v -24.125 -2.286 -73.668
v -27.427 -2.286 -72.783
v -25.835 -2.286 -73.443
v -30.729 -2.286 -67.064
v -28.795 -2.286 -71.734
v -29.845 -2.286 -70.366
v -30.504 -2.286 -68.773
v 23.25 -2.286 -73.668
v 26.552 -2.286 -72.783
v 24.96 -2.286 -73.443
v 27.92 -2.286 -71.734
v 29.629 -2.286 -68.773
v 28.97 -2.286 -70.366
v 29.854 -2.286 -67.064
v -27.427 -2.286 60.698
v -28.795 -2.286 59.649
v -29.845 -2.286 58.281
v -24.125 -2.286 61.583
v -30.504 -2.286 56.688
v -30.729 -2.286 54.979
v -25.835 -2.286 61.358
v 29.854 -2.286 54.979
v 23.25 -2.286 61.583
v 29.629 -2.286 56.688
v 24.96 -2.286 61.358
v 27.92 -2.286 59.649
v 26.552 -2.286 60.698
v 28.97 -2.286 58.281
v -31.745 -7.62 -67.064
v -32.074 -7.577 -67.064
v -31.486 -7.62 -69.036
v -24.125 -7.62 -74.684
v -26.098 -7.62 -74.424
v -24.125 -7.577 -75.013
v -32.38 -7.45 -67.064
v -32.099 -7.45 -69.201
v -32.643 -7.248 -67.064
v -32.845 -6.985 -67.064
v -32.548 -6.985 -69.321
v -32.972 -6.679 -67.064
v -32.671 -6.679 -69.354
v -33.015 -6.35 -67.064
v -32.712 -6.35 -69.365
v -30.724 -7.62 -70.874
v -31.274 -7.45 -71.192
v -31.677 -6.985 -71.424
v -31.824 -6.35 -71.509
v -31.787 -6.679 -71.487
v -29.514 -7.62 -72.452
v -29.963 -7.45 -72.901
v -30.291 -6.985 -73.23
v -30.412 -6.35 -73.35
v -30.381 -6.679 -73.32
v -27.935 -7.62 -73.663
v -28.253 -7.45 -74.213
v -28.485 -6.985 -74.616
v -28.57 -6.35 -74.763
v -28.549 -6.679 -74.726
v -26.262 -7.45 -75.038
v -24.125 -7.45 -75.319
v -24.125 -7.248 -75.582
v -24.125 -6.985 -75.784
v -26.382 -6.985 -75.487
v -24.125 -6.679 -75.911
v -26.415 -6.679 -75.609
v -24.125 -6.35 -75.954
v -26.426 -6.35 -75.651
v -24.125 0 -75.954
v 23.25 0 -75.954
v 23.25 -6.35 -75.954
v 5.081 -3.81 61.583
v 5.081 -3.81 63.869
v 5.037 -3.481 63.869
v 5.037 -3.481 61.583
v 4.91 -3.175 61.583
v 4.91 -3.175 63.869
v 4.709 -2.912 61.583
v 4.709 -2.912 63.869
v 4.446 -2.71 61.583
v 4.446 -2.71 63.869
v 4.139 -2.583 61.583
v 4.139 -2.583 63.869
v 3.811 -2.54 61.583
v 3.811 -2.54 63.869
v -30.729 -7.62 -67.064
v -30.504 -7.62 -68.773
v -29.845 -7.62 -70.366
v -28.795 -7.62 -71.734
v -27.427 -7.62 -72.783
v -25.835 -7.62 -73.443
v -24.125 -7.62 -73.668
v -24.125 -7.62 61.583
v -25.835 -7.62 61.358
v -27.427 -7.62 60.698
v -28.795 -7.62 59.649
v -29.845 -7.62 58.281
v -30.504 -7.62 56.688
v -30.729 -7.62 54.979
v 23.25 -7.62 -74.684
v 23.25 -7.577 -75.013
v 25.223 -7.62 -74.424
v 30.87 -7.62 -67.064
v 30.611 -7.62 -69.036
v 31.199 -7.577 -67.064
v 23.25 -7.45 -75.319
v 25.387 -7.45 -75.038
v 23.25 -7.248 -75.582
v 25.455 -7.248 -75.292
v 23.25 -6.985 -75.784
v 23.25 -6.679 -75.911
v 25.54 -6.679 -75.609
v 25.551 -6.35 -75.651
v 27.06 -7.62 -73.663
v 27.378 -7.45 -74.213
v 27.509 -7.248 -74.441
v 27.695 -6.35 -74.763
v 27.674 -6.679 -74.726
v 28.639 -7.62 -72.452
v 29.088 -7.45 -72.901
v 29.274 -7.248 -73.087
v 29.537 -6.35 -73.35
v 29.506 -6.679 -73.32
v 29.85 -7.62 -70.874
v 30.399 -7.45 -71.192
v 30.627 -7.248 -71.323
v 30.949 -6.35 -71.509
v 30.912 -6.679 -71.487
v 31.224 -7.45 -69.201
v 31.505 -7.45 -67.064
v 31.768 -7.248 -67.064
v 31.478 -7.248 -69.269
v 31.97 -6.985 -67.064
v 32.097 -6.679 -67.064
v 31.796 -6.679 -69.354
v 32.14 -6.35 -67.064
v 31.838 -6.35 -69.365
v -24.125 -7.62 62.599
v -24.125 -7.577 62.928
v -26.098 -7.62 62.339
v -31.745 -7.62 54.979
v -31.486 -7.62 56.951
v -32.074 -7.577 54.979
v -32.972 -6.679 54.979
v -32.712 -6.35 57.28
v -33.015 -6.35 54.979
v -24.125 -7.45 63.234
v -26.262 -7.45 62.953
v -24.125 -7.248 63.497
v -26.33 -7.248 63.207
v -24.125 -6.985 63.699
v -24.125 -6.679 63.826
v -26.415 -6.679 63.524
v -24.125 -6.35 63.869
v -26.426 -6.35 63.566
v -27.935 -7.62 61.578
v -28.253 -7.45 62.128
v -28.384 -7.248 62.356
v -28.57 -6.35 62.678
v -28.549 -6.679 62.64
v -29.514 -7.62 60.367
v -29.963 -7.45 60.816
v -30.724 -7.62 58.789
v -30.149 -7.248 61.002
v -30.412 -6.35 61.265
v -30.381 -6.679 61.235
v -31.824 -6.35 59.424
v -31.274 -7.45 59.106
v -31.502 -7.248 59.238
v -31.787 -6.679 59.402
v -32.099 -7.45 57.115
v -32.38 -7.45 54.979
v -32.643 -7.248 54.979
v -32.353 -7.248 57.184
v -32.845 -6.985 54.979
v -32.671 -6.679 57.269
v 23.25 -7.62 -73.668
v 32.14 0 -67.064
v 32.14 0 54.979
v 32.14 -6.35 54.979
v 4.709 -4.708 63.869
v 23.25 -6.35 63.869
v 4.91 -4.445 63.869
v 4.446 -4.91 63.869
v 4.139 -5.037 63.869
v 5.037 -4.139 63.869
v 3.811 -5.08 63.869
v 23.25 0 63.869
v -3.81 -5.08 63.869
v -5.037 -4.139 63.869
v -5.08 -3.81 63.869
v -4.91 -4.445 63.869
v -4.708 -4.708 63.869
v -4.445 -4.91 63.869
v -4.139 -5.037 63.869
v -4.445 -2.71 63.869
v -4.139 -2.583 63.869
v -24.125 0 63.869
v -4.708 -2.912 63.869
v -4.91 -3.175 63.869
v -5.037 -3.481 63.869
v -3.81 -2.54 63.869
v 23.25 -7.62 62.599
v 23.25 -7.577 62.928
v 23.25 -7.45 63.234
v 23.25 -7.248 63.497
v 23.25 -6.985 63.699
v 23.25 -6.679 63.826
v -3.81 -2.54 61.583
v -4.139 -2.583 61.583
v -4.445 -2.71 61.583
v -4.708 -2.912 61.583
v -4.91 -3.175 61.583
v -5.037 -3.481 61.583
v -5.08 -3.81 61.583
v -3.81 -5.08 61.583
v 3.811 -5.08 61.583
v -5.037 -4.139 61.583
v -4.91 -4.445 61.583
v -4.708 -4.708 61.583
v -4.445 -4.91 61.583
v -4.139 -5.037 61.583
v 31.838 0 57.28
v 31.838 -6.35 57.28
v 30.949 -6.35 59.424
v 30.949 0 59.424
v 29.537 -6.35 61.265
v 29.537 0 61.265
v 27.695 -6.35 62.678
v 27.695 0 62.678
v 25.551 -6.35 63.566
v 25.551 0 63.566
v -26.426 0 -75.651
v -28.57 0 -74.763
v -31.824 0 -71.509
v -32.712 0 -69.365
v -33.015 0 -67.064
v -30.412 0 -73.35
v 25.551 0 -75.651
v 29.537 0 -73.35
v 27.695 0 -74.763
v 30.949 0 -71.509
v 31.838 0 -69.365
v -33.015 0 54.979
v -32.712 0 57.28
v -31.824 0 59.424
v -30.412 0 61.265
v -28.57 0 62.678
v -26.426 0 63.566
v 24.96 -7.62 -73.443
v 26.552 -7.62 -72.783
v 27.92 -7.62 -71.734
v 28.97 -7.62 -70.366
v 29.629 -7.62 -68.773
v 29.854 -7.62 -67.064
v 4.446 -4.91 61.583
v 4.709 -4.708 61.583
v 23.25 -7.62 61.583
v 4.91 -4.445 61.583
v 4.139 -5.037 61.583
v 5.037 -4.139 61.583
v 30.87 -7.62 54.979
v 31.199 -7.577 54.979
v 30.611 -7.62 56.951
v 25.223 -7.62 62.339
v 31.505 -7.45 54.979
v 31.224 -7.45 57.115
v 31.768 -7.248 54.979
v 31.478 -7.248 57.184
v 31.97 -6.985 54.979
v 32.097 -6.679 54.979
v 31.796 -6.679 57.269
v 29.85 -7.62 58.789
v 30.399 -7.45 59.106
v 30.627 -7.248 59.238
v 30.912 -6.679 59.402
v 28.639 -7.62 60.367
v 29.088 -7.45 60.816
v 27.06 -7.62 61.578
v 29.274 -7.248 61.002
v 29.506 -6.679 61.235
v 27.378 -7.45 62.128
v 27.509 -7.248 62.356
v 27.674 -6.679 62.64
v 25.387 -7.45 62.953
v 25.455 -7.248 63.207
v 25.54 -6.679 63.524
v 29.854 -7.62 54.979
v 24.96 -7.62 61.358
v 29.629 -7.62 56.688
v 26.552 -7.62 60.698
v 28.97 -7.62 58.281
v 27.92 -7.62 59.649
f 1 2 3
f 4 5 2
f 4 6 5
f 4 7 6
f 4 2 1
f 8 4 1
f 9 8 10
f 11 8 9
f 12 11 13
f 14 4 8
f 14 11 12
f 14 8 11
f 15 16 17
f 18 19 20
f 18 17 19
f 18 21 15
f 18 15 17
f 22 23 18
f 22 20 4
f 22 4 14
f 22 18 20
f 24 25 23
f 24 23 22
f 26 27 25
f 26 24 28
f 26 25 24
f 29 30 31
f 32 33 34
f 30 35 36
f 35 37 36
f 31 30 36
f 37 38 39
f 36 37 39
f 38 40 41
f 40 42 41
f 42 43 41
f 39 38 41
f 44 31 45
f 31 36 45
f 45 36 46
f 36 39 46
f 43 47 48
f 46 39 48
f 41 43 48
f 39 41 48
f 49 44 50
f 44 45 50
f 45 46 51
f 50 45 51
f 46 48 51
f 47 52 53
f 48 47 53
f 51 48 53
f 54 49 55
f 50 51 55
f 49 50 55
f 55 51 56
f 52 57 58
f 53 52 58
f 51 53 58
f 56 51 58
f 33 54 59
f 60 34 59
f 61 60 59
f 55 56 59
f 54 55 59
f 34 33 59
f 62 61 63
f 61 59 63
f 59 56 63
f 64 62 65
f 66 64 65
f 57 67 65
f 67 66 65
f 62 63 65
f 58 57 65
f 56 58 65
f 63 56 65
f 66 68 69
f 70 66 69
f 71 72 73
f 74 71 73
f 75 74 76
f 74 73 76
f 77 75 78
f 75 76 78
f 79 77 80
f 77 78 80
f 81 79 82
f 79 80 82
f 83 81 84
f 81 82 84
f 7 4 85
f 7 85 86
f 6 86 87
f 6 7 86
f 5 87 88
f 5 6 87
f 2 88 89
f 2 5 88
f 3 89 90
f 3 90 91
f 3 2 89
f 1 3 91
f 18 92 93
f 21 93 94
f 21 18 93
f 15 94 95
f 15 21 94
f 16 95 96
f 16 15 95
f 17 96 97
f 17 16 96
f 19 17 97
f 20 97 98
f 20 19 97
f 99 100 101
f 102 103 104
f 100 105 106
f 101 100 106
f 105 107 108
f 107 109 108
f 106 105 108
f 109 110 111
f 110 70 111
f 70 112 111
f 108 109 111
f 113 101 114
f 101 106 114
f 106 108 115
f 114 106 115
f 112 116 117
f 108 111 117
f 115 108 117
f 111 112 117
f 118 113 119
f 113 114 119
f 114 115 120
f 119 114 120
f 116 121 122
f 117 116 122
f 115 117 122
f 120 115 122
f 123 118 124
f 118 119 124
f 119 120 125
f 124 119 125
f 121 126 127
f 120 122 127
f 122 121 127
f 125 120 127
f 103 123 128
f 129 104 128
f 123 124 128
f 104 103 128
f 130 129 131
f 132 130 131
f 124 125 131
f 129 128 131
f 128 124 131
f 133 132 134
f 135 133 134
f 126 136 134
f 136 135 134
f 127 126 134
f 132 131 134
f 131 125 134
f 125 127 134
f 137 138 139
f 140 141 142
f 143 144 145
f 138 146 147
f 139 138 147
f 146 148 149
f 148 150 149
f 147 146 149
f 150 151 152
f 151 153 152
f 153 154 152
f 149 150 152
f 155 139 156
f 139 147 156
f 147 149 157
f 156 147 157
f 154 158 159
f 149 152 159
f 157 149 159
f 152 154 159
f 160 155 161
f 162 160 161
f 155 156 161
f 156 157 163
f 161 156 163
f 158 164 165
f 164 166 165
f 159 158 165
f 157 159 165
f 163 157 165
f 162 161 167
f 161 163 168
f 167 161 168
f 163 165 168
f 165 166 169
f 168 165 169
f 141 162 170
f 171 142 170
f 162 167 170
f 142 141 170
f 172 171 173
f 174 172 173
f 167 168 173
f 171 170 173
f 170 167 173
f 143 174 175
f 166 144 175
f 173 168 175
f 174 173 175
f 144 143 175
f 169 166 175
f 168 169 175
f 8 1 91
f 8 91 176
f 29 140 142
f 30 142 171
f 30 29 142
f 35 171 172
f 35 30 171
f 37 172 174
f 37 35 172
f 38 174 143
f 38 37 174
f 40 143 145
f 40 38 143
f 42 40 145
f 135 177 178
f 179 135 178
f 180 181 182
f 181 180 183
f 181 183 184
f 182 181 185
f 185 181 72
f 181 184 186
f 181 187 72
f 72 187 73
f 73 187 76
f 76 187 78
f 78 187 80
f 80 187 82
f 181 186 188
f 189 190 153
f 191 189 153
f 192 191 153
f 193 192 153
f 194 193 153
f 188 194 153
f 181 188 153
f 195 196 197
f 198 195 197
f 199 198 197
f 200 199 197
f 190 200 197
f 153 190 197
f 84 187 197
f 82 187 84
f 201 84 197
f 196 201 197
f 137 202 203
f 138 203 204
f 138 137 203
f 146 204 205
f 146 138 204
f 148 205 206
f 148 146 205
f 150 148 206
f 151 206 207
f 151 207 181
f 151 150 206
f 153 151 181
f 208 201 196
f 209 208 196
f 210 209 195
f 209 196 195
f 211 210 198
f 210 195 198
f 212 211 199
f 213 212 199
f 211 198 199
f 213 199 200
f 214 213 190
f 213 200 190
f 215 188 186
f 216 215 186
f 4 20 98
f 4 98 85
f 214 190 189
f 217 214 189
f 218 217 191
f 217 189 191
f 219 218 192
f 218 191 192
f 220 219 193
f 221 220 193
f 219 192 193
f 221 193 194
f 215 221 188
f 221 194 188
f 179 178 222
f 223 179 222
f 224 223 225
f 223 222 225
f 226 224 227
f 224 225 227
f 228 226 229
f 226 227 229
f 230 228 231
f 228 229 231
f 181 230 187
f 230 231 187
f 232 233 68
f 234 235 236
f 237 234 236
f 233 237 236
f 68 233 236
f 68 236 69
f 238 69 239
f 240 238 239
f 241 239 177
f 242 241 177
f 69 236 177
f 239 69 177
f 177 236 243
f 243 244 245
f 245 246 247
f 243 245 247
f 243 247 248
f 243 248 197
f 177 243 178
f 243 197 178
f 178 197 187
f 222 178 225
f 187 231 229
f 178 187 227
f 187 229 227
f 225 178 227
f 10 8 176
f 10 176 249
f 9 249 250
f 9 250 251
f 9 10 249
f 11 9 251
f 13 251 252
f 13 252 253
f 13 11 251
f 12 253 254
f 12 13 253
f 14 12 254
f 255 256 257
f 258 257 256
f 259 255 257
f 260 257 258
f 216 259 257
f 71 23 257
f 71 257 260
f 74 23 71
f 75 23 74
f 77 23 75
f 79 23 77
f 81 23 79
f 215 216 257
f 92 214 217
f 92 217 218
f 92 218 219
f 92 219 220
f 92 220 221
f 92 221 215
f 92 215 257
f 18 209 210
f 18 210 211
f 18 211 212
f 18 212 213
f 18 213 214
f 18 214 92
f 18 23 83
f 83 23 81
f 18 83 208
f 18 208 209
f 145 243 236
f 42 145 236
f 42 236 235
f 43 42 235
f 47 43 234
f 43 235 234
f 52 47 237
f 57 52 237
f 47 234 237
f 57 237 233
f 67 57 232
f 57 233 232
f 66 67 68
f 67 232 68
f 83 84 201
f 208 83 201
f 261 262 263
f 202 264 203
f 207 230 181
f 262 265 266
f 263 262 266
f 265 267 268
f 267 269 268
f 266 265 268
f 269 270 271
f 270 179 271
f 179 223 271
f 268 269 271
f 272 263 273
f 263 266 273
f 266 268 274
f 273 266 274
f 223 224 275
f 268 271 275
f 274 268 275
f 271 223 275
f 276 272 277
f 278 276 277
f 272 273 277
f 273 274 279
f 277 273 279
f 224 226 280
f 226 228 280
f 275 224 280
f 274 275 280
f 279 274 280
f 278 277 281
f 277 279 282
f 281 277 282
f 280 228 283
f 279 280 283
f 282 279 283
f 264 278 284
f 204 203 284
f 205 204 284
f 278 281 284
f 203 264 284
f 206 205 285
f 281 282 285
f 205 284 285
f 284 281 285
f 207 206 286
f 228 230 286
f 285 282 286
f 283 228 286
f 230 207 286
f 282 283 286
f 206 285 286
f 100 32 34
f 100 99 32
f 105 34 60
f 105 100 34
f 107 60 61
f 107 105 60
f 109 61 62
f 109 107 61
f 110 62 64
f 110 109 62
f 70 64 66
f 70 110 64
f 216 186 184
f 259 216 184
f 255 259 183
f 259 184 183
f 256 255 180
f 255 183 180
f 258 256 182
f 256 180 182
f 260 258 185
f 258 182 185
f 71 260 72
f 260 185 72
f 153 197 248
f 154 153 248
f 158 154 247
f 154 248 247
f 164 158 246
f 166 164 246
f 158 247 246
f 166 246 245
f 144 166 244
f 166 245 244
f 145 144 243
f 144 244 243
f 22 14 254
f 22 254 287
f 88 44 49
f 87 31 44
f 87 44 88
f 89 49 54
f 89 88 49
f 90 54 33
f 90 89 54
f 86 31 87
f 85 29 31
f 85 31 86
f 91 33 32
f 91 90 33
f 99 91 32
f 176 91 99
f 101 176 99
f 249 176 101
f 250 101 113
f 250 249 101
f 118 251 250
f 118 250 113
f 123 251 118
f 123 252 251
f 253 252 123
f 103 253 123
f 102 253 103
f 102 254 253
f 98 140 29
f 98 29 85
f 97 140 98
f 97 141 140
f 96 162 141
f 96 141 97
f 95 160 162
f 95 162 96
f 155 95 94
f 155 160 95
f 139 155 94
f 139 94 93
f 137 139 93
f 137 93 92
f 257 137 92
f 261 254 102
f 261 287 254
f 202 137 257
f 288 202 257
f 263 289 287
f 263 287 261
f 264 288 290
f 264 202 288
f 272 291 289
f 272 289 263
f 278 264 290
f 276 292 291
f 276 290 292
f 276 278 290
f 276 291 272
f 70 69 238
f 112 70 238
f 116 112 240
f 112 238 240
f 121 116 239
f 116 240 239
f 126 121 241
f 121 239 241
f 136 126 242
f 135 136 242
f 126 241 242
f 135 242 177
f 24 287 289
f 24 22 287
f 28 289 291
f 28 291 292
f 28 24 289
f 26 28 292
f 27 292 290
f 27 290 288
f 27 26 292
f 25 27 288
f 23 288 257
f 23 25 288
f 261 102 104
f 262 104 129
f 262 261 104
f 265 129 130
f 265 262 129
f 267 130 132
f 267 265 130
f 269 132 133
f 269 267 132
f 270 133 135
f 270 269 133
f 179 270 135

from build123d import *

# Parameters (mm, degrees)
F1_DEPTH = 7.62
F3_T     = -2.286
F5_DEPTH = 15.5702
F6_R     = 1.27


with BuildPart() as f1:
    # F0 (on Front) → F1 (new body)
    with BuildSketch(Plane.XZ):
        with BuildLine():
            Line((23.2504412389, 63.8689214671), (-24.1253591931, 63.8689214671))
            ThreePointArc((-24.1253591931, 63.8689214671), (-30.4115384778, 61.2651007518), (-33.0153591931, 54.9789214671))
            Line((-33.0153591931, 54.9789214671), (-33.0153591931, -67.0640870786))
            ThreePointArc((-33.0153591931, -67.0640870786), (-30.4115384778, -73.3502663633), (-24.1253591931, -75.9540870786))
            Line((-24.1253591931, -75.9540870786), (23.2504412389, -75.9540870786))
            ThreePointArc((23.2504412389, -75.9540870786), (29.5366205236, -73.3502663633), (32.1404412389, -67.0640870786))
            Line((32.1404412389, -67.0640870786), (32.1404412389, 54.9789214671))
            ThreePointArc((32.1404412389, 54.9789214671), (29.5366205236, 61.2651007518), (23.2504412389, 63.8689214671))
        make_face()
    extrude(amount=F1_DEPTH)

    # F3
    f3_openings = [f1.faces().sort_by_distance(p)[0] for p in [
        (-0.437459, -7.62, -6.042583),
    ]]
    offset(amount=F3_T, openings=f3_openings)

    # F4 (on face) → F5 (cut)
    with BuildSketch(Plane.XY.offset(63.8689214671)):
        with BuildLine():
            Line((3.8106236157, -2.5396881921), (-3.81, -2.5396881921))
            ThreePointArc((-3.81, -2.5396881921), (-4.7080256121, -2.91166258), (-5.08, -3.8096881921))
            Line((-5.08, -3.8096881921), (-5.08, -3.8103118079))
            ThreePointArc((-5.08, -3.8103118079), (-4.7080256121, -4.70833742), (-3.81, -5.0803118079))
            Line((-3.81, -5.0803118079), (3.8106236157, -5.0803118079))
            ThreePointArc((3.8106236157, -5.0803118079), (4.7086492278, -4.70833742), (5.0806236157, -3.8103118079))
            Line((5.0806236157, -3.8103118079), (5.0806236157, -3.8096881921))
            ThreePointArc((5.0806236157, -3.8096881921), (4.7086492278, -2.91166258), (3.8106236157, -2.5396881921))
        make_face()
    extrude(amount=-F5_DEPTH, mode=Mode.SUBTRACT)

    # F6
    f6_edges = [f1.edges().sort_by_distance(p)[0] for p in [
        (-0.437459, -7.62, -75.954087),
        (29.536621, -7.62, -73.350266),
        (32.140441, -7.62, -6.042583),
        (29.536621, -7.62, 61.265101),
        (-0.437459, -7.62, 63.868921),
        (-30.411538, -7.62, -73.350266),
        (-33.015359, -7.62, -6.042583),
    ]]
    fillet(f6_edges, radius=F6_R)


solid = f1.part
